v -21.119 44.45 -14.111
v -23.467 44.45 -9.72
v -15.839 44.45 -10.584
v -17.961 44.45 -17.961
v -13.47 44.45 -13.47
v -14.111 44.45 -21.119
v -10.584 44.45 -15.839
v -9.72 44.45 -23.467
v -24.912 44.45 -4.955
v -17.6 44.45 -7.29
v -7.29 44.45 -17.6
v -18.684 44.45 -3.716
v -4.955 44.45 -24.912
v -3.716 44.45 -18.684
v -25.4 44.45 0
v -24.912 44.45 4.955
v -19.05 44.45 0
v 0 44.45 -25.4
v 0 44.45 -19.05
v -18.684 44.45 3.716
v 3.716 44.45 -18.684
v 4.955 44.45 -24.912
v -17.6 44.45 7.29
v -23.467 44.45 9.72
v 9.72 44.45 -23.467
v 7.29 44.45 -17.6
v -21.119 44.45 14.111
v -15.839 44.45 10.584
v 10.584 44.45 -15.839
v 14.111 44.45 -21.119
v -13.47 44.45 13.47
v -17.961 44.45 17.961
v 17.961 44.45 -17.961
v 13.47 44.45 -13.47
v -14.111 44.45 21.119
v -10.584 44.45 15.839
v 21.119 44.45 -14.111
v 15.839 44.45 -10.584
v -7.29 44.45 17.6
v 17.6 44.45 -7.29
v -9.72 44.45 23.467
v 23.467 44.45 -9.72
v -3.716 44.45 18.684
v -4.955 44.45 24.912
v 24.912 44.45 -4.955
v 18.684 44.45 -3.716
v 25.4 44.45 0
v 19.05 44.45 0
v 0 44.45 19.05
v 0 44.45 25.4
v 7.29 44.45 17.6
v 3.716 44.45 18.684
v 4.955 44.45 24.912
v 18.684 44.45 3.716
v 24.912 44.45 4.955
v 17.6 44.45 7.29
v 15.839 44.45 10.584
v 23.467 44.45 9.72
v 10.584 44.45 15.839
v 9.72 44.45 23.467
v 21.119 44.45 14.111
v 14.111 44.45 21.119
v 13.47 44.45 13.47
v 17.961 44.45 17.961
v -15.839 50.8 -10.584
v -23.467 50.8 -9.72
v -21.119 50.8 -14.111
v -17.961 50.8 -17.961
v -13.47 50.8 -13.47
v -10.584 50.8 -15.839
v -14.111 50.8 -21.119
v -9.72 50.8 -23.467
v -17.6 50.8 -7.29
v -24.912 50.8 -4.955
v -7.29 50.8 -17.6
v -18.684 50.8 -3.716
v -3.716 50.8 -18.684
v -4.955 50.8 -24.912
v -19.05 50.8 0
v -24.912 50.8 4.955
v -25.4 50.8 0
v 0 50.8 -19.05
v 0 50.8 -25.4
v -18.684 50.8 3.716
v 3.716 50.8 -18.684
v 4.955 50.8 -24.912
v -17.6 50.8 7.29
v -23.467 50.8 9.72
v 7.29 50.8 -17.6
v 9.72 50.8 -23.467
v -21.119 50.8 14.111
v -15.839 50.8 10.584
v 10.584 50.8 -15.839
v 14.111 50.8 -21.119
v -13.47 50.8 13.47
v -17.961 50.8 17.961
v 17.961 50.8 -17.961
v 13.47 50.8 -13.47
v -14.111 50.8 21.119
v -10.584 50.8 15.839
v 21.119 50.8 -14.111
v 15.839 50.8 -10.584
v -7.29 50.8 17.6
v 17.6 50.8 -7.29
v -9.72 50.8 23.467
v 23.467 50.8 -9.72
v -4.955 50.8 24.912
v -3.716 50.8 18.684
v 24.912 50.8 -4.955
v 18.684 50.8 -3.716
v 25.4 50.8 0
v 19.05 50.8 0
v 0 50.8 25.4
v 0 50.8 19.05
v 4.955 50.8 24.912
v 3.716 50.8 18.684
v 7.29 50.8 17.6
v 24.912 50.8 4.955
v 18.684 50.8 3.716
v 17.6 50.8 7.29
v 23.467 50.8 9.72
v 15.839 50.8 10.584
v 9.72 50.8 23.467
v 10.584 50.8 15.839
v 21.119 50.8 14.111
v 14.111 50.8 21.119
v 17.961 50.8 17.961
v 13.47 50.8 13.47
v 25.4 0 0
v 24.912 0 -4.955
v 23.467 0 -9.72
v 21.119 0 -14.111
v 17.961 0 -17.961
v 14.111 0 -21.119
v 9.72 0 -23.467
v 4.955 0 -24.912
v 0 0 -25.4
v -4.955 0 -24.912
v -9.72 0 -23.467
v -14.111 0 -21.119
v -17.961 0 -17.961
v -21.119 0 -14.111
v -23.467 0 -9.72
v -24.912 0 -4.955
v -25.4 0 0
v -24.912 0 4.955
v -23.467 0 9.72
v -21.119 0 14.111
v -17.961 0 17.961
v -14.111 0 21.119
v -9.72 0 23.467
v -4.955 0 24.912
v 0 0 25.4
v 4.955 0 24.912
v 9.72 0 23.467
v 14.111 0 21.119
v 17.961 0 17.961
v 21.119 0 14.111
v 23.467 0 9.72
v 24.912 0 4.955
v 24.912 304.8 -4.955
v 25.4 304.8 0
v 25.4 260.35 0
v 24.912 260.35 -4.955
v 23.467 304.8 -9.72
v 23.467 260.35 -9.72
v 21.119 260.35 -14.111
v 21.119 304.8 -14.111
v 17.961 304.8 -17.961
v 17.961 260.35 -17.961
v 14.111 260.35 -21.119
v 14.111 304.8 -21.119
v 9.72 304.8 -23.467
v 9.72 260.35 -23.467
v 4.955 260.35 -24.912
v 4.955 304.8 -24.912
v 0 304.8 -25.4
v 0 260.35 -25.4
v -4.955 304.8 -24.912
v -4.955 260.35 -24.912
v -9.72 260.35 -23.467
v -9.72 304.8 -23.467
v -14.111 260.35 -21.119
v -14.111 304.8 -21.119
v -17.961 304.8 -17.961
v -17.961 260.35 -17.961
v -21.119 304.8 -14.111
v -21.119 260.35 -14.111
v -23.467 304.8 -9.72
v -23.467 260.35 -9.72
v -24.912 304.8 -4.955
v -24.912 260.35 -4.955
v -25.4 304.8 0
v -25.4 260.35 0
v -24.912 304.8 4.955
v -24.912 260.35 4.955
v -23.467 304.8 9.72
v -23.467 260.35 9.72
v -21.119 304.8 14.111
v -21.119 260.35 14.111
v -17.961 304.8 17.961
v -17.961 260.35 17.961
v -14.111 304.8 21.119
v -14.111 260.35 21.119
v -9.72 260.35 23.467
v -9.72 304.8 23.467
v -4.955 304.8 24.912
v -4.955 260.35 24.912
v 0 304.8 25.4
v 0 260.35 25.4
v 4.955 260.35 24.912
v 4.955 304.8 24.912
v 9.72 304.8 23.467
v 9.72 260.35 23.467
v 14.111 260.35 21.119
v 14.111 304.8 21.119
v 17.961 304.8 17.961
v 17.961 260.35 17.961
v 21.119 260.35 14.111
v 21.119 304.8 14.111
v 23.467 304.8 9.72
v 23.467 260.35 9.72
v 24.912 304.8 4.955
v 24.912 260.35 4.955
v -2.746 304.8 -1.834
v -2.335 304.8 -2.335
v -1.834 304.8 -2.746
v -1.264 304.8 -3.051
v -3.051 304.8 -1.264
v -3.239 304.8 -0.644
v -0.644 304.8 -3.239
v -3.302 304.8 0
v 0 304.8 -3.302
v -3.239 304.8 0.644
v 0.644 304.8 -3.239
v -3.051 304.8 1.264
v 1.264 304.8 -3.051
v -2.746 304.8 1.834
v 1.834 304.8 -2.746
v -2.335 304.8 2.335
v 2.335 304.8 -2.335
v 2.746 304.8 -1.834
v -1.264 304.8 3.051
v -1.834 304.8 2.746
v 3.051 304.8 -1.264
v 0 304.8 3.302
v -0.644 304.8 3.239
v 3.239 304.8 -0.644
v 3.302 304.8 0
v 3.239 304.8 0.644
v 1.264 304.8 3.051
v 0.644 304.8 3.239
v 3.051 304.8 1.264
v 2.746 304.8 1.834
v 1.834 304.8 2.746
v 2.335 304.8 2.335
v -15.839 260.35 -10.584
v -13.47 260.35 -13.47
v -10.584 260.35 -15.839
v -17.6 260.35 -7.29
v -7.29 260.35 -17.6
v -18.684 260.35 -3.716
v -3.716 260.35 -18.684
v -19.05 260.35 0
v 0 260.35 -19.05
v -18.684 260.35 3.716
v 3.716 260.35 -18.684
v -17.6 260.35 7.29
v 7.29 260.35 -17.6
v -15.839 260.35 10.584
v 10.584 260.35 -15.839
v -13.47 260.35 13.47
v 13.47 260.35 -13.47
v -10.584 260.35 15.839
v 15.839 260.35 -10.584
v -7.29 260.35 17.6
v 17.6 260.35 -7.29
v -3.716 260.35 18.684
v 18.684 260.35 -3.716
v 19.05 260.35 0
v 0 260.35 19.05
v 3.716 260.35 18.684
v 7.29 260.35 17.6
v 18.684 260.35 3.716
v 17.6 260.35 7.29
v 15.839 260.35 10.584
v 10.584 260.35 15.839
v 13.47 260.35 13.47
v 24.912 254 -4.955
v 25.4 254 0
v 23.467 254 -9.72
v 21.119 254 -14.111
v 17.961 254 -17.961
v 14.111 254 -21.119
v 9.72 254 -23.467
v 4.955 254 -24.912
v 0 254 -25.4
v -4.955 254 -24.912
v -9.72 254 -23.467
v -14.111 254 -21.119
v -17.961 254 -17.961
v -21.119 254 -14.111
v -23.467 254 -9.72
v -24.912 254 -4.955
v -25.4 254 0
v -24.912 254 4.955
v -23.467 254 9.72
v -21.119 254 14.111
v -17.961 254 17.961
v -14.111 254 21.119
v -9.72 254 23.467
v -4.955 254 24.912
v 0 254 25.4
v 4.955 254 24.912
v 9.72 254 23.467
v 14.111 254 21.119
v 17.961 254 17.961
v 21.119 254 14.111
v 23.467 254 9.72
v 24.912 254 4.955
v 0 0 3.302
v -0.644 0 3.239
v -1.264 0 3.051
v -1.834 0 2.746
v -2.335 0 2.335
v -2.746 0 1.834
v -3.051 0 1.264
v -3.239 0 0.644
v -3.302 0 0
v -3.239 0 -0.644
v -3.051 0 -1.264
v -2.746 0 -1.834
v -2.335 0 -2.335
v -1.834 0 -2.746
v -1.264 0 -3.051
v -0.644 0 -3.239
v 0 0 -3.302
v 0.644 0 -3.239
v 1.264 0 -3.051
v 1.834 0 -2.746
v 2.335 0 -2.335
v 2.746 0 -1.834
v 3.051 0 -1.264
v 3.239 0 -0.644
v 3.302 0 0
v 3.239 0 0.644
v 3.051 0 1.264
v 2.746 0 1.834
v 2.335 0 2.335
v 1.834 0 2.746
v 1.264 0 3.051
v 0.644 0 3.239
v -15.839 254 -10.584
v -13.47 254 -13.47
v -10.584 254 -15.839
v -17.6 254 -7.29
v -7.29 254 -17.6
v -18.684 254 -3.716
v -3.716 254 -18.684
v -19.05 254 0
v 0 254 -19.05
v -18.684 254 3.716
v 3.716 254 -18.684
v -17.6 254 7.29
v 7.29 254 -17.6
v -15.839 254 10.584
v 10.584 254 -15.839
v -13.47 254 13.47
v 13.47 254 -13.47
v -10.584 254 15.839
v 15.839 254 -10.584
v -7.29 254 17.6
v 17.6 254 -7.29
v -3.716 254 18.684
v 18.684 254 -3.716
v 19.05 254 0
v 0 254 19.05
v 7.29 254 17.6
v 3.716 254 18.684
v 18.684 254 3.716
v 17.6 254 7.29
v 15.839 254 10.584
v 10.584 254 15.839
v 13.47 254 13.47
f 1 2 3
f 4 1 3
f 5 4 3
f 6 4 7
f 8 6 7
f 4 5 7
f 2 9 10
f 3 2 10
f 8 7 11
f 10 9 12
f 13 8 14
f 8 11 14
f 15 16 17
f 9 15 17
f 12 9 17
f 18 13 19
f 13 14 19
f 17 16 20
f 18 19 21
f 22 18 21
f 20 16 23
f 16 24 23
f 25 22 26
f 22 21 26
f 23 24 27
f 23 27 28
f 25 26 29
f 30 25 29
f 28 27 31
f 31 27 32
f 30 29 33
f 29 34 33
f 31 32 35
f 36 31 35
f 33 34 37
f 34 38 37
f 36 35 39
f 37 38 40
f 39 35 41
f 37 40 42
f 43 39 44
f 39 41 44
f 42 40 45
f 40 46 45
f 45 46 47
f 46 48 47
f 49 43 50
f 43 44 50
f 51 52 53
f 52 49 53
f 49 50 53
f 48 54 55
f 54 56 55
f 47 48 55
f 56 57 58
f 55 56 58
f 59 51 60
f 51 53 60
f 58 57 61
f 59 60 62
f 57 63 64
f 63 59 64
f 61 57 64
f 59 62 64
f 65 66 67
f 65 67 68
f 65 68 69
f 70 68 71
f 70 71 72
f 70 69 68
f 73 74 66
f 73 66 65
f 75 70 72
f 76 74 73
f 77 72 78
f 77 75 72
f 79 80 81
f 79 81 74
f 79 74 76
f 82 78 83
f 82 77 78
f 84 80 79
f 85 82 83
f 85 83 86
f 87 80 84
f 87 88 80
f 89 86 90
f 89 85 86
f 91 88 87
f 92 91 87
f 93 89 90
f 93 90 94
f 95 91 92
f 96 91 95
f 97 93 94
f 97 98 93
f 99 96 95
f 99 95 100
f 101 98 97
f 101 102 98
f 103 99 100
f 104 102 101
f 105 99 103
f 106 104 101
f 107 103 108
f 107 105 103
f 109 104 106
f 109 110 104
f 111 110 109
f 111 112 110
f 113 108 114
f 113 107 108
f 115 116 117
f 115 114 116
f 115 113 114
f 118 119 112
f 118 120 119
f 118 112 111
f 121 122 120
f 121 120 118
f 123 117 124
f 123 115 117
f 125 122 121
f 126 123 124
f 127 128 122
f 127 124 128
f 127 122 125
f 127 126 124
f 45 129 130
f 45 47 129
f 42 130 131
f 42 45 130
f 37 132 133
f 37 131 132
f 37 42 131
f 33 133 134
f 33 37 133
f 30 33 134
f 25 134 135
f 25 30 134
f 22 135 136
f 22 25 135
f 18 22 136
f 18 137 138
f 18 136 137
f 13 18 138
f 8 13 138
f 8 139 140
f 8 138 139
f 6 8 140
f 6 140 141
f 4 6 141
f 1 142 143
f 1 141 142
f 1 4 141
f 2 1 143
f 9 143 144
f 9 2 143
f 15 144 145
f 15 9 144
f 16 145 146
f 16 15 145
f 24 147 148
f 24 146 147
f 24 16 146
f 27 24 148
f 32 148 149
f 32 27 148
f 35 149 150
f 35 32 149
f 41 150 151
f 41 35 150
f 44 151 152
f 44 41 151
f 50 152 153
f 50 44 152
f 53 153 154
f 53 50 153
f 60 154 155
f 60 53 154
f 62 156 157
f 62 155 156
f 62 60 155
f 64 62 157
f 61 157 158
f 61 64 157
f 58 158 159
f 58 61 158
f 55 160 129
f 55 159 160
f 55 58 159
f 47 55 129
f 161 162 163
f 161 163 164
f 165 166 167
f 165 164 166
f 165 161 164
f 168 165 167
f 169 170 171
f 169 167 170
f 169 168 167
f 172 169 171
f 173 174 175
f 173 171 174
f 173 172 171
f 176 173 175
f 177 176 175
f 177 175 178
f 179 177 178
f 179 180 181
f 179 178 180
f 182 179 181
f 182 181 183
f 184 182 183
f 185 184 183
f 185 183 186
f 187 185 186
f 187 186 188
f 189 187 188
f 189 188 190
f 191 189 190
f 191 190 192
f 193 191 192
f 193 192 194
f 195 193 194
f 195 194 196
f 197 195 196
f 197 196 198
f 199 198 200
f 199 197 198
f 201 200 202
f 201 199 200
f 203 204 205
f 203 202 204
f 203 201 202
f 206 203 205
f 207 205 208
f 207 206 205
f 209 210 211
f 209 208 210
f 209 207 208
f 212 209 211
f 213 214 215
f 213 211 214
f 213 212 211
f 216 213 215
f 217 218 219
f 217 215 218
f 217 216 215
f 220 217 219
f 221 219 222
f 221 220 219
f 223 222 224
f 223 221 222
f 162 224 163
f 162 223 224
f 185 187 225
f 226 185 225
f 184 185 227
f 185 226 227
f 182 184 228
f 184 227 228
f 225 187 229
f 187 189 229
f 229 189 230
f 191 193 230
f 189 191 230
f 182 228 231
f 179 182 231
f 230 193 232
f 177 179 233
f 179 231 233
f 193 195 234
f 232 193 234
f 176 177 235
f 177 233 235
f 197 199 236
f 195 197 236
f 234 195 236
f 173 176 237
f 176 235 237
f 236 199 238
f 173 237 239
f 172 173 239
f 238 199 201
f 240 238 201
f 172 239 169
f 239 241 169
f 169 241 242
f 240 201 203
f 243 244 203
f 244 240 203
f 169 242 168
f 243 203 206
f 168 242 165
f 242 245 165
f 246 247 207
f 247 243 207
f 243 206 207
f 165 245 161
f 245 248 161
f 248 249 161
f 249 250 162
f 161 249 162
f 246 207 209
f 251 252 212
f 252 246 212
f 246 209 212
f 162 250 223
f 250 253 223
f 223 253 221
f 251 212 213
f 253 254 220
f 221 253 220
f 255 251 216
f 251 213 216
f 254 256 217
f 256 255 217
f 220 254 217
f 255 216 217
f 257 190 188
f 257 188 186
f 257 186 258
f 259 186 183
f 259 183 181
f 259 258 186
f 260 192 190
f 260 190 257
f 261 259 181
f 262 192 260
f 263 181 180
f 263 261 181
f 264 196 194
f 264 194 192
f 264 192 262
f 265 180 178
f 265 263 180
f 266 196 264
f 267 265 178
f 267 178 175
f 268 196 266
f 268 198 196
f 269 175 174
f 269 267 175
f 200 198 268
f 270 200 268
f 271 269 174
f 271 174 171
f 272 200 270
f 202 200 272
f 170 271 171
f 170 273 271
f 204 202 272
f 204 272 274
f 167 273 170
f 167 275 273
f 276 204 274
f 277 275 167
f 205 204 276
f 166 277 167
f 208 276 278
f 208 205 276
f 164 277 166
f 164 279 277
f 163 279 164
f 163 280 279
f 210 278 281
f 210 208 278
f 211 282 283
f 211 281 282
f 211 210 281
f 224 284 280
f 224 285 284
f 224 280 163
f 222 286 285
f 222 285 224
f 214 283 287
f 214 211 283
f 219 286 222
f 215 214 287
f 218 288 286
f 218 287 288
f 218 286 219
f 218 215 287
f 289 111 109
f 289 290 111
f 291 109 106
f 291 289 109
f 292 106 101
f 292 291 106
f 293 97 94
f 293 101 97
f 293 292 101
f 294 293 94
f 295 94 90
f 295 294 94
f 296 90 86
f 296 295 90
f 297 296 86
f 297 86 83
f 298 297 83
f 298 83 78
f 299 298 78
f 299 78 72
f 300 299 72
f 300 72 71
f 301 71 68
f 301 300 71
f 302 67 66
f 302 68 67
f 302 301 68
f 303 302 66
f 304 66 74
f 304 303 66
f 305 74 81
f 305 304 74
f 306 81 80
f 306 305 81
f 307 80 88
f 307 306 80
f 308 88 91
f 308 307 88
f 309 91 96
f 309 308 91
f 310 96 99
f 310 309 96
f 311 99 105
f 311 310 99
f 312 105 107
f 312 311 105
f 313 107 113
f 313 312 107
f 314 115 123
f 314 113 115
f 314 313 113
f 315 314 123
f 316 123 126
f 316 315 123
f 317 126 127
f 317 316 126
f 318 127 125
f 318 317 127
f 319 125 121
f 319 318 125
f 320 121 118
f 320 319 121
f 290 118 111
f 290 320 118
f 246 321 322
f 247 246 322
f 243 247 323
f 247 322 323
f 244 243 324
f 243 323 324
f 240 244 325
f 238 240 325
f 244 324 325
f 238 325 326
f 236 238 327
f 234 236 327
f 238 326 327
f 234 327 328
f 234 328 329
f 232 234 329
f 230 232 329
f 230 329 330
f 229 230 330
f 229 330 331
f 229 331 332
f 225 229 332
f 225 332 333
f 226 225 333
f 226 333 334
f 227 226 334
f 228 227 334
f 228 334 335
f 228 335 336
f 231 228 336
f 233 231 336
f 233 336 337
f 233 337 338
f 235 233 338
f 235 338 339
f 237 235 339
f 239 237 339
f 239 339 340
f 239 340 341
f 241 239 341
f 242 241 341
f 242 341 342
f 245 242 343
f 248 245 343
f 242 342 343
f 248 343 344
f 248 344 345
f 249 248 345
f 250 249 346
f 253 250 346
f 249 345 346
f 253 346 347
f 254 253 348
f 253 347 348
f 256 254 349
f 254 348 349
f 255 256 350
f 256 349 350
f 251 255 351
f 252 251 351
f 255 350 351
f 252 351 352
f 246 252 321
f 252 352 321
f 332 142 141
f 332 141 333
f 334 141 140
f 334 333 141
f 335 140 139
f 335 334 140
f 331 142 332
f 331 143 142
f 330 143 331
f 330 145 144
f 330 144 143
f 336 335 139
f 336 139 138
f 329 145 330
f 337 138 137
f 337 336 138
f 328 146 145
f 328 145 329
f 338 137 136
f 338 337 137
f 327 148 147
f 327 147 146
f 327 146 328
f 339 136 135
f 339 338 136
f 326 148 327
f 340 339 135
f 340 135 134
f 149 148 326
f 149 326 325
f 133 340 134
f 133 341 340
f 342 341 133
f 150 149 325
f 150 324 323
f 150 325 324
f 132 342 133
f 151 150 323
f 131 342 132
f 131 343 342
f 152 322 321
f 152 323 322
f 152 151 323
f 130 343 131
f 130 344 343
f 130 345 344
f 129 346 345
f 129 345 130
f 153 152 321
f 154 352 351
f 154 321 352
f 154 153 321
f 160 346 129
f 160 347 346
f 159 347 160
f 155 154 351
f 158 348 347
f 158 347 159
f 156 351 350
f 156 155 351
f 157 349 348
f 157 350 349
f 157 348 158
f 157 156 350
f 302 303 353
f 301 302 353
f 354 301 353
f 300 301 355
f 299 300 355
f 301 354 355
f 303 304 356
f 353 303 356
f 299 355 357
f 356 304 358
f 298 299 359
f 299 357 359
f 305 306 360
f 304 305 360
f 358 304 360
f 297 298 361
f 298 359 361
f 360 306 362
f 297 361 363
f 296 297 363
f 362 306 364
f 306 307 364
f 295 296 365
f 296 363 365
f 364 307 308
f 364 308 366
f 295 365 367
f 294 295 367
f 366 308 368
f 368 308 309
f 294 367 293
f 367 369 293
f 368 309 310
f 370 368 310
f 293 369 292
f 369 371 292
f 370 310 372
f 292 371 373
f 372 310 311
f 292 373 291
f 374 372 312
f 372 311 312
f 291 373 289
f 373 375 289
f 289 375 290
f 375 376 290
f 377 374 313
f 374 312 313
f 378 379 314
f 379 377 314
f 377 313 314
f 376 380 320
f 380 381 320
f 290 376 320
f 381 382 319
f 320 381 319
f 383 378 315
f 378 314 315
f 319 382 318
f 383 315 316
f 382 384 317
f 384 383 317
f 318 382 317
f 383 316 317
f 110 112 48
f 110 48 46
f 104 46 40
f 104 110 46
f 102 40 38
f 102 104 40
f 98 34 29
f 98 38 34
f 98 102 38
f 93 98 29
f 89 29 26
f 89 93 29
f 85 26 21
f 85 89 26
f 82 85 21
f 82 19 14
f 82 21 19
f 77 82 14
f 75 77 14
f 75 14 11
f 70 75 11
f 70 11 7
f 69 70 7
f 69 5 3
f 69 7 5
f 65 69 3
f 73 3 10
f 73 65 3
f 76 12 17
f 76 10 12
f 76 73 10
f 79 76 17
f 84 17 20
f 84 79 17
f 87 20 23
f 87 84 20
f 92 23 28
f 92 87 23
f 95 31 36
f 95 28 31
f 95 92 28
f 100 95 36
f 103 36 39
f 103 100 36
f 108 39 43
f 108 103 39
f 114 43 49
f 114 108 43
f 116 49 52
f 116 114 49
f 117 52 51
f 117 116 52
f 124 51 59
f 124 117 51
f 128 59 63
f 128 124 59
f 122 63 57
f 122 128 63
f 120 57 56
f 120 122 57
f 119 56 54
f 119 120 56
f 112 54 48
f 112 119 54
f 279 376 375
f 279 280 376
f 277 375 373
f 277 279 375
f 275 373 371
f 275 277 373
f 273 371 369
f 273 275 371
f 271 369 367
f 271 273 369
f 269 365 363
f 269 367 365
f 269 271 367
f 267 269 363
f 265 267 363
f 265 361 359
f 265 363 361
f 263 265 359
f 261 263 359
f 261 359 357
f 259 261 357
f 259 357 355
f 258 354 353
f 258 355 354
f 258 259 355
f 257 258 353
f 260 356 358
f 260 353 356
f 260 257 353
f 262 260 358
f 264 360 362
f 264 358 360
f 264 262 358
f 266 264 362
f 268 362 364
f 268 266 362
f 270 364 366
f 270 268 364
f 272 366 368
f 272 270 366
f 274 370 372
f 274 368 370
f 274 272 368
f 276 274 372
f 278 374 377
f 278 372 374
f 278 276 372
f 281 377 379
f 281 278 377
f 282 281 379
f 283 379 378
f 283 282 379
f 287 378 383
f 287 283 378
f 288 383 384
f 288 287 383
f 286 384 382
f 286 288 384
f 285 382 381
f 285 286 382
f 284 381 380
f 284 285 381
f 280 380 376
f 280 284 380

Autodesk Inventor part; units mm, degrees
ref_plane "YZ Plane" through (0, 0, 0) normal (1, 0, 0) x (0, 1, 0)
ref_plane "XZ Plane" through (0, 0, 0) normal (0, 1, 0) x (-1, 0, 0)
ref_plane "XY Plane" through (0, 0, 0) normal (0, 0, 1) x (1, 0, 0)
sketch "Sketch1" plane through (0, 0, 0) normal (0, 0, 1) x (1, 0, 0)
  line L0 (0, 0) -> (25.4, 0)
  line L1 (25.4, 304.8) -> (0, 304.8)
  line L2 (0, 304.8) -> (0, 0)
  line L3 (25.4, 44.45) -> (19.05, 44.45)
  line L4 (19.05, 44.45) -> (19.05, 50.8)
  line L5 (19.05, 50.8) -> (25.4, 50.8)
  line L6 (25.4, 254) -> (19.05, 254)
  line L7 (19.05, 254) -> (19.05, 260.35)
  line L8 (19.05, 260.35) -> (25.4, 260.35)
  line L9 (25.4, 260.35) -> (25.4, 304.8)
  line L10 (25.4, 0) -> (25.4, 44.45)
  line L11 (25.4, 50.8) -> (25.4, 254)
  point P0 (12.7, 152.4)
  point P1 (12.7, 0)
  dimension "d3" = 6.35
  dimension "d4" = 6.35
  dimension "d5" = 6.35
  dimension "d7" = 6.35
  dimension "d8" = 25.4
  dimension "d9" = 25.4
  dimension "d10" = 25.4
  dimension "d11" = 304.8
  dimension "d12" = 152.4
  dimension "d13" = 101.6
  dimension "d14" = 101.6
revolve "Revolution1" add sketch "Sketch1" angle 360 about axis through (0, 304.8, 0) along (0, -1, 0)
sketch "Sketch2" plane through (0, 304.8, 0) normal (0, 1, 0) x (1, 0, 0)
  point P0 (0, 0)
  point P1 (0, 0)
hole "Hole1" at (0, 304.8, 0) direction (0, -1, 0) diameter 6.604 end through all
equation "\"d12\" = 0.5 * d11"
properties part number "Roller" material "PVC-Piping"
